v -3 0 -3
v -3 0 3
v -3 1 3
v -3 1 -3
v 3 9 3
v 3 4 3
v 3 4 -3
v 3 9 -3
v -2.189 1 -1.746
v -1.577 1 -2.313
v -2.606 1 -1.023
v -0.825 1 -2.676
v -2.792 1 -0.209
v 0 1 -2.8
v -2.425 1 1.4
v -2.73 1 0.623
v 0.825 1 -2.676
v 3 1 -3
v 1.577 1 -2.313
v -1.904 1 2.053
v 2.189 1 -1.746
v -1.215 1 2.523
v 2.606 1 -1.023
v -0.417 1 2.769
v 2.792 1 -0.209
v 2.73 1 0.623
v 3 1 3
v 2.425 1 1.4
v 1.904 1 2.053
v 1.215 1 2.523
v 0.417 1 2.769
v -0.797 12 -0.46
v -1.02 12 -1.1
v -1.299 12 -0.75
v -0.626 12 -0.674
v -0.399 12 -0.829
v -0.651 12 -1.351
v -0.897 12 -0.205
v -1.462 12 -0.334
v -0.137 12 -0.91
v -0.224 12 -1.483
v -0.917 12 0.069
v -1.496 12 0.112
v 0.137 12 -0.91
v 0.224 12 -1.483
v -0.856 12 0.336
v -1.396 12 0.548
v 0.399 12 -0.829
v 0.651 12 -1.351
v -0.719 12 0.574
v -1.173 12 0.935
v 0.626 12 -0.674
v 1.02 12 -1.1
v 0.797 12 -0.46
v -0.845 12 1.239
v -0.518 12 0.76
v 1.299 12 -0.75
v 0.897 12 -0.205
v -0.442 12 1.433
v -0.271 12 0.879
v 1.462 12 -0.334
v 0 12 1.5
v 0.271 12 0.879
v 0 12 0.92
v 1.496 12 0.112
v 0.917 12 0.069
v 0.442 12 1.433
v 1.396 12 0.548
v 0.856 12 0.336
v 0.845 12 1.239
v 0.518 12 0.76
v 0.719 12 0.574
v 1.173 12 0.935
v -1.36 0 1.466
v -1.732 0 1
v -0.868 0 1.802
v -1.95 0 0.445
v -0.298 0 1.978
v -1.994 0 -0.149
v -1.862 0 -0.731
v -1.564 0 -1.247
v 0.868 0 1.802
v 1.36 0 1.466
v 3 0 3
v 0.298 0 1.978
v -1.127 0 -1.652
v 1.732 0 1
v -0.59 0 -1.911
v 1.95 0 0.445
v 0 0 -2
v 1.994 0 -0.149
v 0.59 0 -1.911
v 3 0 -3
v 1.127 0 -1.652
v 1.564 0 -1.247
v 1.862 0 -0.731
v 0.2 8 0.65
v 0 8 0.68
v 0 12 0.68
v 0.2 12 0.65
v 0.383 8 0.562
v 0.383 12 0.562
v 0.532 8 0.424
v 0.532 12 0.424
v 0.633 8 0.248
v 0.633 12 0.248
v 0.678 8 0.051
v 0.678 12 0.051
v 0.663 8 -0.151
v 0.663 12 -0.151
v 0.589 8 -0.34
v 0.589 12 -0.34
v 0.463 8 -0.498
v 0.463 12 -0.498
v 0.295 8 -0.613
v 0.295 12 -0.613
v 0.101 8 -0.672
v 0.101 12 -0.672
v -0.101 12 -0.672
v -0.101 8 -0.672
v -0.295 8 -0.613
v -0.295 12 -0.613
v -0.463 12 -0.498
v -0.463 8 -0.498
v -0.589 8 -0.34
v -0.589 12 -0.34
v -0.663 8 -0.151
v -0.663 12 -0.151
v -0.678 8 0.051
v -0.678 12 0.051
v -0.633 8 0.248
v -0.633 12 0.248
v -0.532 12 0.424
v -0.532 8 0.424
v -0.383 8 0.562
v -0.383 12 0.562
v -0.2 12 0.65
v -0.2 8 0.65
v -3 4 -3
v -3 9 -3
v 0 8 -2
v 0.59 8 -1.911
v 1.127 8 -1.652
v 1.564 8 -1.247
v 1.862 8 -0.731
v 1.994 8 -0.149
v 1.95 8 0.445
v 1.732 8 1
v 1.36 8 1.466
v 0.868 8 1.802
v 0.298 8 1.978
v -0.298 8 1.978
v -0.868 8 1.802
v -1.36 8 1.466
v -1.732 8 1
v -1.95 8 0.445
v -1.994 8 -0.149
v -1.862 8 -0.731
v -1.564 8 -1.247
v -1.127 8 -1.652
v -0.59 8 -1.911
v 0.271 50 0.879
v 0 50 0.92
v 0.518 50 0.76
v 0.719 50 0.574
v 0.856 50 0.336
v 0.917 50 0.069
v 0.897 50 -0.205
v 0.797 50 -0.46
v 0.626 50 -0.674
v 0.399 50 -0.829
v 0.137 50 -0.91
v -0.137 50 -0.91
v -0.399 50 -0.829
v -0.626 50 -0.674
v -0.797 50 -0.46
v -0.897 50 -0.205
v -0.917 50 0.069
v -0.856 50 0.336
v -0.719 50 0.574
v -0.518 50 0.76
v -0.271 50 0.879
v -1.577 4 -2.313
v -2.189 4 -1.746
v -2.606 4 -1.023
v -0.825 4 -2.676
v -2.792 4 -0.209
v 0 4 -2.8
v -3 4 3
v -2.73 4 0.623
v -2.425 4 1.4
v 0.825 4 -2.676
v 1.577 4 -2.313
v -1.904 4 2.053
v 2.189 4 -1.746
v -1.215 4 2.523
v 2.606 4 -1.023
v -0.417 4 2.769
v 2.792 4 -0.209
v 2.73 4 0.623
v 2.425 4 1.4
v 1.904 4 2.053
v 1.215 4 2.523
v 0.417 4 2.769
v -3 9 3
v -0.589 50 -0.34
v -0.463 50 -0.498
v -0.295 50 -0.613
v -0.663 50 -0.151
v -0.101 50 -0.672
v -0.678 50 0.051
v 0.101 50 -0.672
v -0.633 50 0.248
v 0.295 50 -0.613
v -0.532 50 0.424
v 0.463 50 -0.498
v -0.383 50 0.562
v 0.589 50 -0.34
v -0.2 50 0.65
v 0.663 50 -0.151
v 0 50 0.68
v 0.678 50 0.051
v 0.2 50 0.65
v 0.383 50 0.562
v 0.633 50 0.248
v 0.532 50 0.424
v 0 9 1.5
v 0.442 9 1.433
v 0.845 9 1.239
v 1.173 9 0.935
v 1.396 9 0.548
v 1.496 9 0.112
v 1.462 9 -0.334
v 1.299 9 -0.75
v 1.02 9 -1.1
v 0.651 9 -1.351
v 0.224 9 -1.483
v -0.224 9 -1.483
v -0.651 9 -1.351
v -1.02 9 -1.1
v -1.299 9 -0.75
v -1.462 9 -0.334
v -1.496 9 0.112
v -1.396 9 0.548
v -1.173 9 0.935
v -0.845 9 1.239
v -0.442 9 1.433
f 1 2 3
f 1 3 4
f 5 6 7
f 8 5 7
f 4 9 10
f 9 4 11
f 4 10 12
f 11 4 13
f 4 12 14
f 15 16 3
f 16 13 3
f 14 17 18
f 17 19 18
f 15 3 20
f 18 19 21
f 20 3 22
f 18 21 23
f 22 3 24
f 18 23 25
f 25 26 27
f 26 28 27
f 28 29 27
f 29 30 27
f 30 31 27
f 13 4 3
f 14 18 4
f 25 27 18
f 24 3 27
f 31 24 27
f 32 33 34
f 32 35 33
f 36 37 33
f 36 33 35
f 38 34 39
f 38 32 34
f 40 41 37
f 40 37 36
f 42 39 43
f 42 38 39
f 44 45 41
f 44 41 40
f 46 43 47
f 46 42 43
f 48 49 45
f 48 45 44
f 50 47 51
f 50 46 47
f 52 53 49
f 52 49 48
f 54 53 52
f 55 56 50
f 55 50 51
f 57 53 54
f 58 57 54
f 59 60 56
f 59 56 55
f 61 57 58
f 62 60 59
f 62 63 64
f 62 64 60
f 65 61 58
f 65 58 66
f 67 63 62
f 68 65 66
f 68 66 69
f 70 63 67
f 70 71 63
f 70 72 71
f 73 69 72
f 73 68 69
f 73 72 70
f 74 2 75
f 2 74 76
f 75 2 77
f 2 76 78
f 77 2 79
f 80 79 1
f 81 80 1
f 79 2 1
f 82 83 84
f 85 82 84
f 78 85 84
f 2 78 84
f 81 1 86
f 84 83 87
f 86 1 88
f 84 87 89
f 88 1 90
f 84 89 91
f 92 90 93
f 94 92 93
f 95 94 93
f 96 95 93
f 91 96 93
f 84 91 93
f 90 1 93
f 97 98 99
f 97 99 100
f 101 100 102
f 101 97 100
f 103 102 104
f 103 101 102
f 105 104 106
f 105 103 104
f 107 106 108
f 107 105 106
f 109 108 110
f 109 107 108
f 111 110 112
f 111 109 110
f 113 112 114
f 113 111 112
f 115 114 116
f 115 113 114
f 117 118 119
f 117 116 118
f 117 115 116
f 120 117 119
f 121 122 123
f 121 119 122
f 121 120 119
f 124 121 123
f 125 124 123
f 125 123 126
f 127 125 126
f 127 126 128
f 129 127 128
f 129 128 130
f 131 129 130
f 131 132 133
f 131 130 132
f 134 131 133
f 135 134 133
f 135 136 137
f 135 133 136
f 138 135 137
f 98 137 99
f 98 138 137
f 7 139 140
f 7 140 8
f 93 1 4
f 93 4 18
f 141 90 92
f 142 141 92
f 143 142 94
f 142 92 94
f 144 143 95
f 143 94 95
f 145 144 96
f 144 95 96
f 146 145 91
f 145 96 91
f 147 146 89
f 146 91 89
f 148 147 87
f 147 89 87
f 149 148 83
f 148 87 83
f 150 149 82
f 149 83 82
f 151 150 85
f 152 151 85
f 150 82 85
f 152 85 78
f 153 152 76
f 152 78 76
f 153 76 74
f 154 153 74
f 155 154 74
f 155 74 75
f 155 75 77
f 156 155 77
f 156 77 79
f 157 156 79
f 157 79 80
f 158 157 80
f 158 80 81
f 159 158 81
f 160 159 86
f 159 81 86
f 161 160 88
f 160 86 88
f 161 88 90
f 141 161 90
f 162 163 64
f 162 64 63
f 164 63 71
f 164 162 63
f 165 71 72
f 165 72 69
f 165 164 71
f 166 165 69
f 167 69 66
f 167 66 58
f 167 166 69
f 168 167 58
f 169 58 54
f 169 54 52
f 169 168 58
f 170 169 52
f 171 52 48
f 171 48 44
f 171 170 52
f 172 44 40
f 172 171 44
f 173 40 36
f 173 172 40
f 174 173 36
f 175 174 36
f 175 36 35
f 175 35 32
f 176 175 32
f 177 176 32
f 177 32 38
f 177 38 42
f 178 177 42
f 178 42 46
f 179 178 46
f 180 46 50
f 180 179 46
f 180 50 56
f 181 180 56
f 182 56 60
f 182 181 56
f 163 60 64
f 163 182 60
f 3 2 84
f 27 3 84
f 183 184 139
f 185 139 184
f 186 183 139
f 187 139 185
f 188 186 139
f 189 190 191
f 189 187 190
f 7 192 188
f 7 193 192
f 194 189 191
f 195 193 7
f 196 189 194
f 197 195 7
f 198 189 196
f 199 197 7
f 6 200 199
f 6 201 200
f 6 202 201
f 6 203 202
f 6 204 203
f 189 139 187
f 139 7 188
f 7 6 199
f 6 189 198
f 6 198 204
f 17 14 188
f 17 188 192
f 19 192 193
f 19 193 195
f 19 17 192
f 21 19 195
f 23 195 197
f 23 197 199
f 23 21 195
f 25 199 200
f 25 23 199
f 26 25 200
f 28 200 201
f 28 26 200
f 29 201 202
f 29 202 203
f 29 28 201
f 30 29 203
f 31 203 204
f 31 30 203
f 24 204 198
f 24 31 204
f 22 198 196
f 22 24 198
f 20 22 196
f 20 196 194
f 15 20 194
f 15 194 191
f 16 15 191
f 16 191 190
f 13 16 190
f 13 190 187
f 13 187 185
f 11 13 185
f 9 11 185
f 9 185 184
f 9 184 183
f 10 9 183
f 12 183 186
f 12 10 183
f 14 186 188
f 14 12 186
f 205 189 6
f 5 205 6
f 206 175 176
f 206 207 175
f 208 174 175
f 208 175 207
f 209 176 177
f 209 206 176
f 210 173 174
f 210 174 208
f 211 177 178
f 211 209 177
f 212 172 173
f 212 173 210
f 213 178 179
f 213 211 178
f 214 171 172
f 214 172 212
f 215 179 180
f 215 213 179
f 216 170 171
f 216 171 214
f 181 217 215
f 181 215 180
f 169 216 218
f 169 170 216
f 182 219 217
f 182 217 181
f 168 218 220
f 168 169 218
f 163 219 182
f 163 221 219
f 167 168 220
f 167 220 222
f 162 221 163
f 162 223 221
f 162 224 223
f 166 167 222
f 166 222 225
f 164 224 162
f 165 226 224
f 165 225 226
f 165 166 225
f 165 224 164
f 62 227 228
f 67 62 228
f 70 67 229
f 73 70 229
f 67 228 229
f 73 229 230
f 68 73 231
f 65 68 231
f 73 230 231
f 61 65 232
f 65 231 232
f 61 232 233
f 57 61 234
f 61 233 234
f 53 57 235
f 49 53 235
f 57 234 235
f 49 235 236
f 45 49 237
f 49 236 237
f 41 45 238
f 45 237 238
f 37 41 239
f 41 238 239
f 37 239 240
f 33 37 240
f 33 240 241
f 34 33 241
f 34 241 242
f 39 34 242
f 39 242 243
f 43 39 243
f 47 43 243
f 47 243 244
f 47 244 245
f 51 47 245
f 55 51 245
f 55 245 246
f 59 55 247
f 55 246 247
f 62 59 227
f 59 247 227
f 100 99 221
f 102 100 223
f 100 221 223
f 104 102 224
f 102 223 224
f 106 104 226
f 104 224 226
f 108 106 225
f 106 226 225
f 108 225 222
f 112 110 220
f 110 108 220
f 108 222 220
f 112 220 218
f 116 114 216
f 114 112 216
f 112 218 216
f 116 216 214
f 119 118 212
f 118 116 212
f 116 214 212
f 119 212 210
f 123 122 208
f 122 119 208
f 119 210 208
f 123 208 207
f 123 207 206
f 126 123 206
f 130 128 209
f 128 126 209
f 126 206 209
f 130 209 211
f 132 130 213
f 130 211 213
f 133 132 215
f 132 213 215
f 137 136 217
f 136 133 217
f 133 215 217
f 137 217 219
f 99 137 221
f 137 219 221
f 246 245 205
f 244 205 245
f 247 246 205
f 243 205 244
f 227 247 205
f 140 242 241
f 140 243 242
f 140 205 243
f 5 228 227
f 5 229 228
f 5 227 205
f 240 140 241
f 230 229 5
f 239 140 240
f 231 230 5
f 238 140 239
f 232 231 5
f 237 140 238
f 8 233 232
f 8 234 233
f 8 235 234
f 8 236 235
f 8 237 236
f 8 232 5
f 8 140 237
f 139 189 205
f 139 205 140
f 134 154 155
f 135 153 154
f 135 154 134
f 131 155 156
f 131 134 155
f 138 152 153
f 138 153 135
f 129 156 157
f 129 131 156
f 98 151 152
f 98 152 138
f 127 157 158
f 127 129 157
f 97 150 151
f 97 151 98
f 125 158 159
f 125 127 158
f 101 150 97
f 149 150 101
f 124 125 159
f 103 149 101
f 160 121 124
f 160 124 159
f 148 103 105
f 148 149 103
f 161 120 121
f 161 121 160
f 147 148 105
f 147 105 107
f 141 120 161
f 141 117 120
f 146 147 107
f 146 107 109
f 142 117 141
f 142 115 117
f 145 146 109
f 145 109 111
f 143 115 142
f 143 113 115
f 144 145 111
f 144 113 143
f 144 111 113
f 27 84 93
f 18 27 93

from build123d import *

# Parameters (mm, degrees)
SKETCH1_W               = 6
SKETCH1_H               = 6
BOSS_EXTRUDE1_DEPTH     = 9
SKETCH2_R               = 1.5
BOSS_EXTRUDE2_DEPTH     = 3
CUT_EXTRUDE1_DEPTH      = 13.727922061
CUT_EXTRUDE1_DEPTH_BACK = 13.727922061
SKETCH3_R               = 0.68
BOSS_EXTRUDE3_START     = 38
SKETCH3_3_R             = 0.92
SKETCH3_3_R_2           = 0.68
BOSS_EXTRUDE3_DEPTH     = 38
SKETCH4_R               = 2
CUT_EXTRUDE2_DEPTH      = 8
CUT_EXTRUDE3_START      = -1
SKETCH6_W               = 6
SKETCH6_H               = 6
SKETCH6_R               = 2.8
CUT_EXTRUDE3_DEPTH      = 3


with BuildPart() as part:
    # Sketch1 → Boss-Extrude1 (new body)
    with BuildSketch(Plane(origin=(0, 0, 0), x_dir=(1, 0, 0), z_dir=(0, 1, 0))):
        Rectangle(SKETCH1_W, SKETCH1_H)
    extrude(amount=BOSS_EXTRUDE1_DEPTH)

    # Sketch2 → Boss-Extrude2 (add)
    with BuildSketch(Plane(origin=(0, 9, 0), x_dir=(1, 0, 0), z_dir=(0, 1, 0))):
        with Locations(Location((0, 0, 0), (0, 0, 270))):
            Circle(SKETCH2_R)
    extrude(amount=BOSS_EXTRUDE2_DEPTH)

    # Sketch3 → Cut-Extrude1 (cut, two sides: drawn at the far end of the back side and taken through both)
    with BuildSketch(Plane(origin=(0, 12, 0), x_dir=(1, 0, 0), z_dir=(0, 1, 0)).offset(-CUT_EXTRUDE1_DEPTH_BACK)):
        with Locations(Location((0, 0, 0), (0, 0, 270))):
            Circle(SKETCH3_R)
    extrude(amount=CUT_EXTRUDE1_DEPTH + CUT_EXTRUDE1_DEPTH_BACK, mode=Mode.SUBTRACT)

    # Sketch3<3> → Boss-Extrude3 (add)
    with BuildSketch(Plane(origin=(0, 12, 0), x_dir=(1, 0, 0), z_dir=(0, 1, 0)).offset(BOSS_EXTRUDE3_START)):
        with Locations(Location((0, 0, 0), (0, 0, 270))):
            Circle(SKETCH3_3_R)
        with Locations(Location((0, 0, 0), (0, 0, 270))):
            Circle(SKETCH3_3_R_2, mode=Mode.SUBTRACT)
    extrude(amount=-BOSS_EXTRUDE3_DEPTH)

    # Sketch4 → Cut-Extrude2 (cut)
    with BuildSketch(Plane.XZ):
        with Locations(Location((0, 0, 0), (0, 0, 270))):
            Circle(SKETCH4_R)
    extrude(amount=-CUT_EXTRUDE2_DEPTH, mode=Mode.SUBTRACT)

    # Sketch6 → Cut-Extrude3 (cut)
    with BuildSketch(Plane.XZ.offset(CUT_EXTRUDE3_START)):
        Rectangle(SKETCH6_W, SKETCH6_H)
        with Locations(Location((0, 0, 0), (0, 0, 270))):
            Circle(SKETCH6_R, mode=Mode.SUBTRACT)
    extrude(amount=-CUT_EXTRUDE3_DEPTH, mode=Mode.SUBTRACT)


solid = part.part
